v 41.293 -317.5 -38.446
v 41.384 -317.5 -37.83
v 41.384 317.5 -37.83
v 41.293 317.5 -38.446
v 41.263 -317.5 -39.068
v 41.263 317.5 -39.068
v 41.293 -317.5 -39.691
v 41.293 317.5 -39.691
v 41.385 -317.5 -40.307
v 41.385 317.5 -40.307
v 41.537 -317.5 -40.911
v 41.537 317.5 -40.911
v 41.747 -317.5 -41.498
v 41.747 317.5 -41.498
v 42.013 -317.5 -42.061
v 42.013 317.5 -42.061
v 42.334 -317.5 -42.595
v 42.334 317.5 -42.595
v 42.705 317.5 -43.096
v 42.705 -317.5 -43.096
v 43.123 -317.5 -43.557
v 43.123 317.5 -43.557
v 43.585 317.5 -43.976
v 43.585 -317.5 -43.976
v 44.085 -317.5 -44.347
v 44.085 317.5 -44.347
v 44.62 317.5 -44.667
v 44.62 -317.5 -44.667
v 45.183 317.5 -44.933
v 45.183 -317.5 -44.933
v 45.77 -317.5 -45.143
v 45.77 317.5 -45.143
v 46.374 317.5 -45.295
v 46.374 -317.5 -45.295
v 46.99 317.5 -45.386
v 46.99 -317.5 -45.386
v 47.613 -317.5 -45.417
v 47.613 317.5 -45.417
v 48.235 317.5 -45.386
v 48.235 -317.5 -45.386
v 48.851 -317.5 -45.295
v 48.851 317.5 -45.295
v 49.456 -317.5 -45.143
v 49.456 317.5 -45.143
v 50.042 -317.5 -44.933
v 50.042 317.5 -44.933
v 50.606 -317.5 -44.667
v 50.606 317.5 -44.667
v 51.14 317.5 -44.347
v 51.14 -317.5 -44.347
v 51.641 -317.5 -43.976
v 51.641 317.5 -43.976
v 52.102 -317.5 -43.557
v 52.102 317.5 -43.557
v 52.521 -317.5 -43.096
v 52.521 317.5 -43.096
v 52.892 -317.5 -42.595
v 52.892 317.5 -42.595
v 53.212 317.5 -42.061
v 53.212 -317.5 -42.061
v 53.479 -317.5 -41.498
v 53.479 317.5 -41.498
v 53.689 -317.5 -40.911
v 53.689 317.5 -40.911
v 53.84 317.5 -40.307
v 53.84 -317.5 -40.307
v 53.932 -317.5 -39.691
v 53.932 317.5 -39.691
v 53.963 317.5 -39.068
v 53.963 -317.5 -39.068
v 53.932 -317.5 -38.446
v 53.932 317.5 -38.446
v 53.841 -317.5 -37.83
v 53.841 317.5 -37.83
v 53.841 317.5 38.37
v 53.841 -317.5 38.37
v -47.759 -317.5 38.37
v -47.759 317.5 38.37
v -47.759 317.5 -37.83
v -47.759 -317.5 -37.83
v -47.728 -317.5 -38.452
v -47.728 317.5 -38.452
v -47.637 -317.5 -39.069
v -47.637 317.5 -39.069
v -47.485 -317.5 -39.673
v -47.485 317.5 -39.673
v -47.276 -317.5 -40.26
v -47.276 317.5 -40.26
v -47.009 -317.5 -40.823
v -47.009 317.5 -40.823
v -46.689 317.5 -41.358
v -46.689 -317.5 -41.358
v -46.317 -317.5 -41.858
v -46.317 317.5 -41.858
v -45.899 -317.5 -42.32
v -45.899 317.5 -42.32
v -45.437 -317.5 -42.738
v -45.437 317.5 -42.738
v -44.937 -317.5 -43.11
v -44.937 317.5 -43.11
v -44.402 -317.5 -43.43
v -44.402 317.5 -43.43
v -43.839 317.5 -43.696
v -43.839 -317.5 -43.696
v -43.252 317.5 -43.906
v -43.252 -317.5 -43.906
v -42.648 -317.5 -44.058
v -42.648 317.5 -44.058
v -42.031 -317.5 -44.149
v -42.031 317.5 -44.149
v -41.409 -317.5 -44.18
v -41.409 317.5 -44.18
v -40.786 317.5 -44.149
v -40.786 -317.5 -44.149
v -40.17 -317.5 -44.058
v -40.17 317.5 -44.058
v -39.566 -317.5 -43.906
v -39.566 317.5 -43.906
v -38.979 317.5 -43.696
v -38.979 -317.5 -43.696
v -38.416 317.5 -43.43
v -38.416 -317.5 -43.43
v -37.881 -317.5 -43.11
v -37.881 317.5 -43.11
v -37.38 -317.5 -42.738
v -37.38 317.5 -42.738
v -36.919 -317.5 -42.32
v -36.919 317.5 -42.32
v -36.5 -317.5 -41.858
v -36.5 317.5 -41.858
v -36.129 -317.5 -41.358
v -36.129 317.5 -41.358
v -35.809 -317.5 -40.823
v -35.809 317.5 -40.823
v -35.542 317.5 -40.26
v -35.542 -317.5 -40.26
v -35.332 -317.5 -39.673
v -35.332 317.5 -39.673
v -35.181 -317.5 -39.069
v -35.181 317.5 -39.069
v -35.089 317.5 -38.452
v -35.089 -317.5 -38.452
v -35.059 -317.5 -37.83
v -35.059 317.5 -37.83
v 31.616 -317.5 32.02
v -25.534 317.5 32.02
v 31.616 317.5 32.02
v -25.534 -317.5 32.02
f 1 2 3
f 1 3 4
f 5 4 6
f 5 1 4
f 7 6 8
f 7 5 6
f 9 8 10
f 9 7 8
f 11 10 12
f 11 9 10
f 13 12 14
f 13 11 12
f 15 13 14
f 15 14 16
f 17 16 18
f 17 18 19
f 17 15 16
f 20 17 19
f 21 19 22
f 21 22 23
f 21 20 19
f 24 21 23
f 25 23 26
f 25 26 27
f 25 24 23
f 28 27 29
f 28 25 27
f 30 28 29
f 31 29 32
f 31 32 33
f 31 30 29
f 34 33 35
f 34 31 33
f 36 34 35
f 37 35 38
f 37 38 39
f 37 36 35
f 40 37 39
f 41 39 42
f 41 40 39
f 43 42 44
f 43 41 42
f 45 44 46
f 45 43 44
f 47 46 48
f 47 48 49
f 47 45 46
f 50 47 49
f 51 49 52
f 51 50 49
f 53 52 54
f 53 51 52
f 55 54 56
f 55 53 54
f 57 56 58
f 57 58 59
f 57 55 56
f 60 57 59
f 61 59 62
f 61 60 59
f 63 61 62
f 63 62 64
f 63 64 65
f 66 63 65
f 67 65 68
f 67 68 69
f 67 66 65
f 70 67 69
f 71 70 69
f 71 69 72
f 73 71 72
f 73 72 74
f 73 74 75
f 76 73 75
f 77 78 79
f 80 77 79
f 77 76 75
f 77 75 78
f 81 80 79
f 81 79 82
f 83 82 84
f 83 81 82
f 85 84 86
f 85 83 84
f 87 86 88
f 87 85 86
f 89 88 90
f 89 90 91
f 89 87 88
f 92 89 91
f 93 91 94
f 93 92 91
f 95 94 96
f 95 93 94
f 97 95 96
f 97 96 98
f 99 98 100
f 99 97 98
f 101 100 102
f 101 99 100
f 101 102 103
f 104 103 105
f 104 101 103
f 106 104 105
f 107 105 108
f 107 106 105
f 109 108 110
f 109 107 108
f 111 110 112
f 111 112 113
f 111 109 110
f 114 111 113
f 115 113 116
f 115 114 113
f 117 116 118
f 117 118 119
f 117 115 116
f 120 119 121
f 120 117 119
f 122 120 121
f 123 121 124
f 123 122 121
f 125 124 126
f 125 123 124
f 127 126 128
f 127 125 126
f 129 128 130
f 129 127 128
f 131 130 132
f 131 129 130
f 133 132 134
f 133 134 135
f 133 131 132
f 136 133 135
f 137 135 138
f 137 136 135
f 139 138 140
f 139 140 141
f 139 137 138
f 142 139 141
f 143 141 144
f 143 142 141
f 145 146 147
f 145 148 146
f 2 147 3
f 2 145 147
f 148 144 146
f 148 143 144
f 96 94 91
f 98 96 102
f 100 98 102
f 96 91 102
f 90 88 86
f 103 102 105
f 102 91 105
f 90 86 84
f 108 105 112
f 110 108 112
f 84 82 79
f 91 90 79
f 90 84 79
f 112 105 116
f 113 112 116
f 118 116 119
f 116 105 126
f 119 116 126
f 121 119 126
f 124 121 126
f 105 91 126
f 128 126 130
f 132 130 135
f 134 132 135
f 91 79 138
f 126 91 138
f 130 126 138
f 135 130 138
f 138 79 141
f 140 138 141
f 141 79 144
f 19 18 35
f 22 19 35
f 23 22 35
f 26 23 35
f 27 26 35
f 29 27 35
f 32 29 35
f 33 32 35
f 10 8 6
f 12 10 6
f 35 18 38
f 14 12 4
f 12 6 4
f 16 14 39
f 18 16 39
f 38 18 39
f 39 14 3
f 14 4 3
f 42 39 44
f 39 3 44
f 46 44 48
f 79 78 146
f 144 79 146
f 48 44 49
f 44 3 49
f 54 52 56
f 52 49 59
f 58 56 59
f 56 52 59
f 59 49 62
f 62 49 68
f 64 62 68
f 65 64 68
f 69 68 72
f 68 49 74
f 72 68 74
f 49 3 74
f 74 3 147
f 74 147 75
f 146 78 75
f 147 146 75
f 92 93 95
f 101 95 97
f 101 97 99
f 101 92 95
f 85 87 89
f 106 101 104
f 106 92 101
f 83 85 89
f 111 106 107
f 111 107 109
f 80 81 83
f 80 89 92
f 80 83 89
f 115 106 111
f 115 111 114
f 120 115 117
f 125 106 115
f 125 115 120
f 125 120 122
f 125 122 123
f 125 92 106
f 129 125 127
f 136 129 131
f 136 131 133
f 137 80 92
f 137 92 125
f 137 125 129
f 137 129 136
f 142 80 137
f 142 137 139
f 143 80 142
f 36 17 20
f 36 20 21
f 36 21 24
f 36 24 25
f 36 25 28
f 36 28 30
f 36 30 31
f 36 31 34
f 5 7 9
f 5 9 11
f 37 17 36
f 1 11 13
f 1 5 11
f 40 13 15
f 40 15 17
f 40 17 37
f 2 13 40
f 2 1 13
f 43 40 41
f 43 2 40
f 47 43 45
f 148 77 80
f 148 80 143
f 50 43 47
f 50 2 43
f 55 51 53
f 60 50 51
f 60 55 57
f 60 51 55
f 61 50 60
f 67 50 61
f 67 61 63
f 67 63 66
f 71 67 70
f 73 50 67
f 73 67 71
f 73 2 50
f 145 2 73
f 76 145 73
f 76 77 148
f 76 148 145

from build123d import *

# Parameters (mm, degrees)
F1_DEPTH = 317.5


with BuildPart() as f1:
    # F0 (on Front) → F1 (new body, symmetric)
    with BuildSketch(Plane.XZ):
        with BuildLine():
            Line((53.8411306598, 32.0202162549), (31.6161306598, 32.0202162549))
            Line((31.6161306598, 32.0202162549), (41.3843568915, -37.8297837451))
            ThreePointArc((41.3843568915, -37.8297837451), (47.6127437756, -45.416592874), (53.8411306598, -37.8297837451))
            Line((53.8411306598, -37.8297837451), (53.8411306598, 32.0202162549))
        make_face()
        Polygon((3.0411306598, 38.3702162549), (3.0411306598, 32.0202162549), (31.6161306598, 32.0202162549), (53.8411306598, 32.0202162549), (53.8411306598, 38.3702162549), align=None)
        Polygon((-47.7588693402, 38.3702162549), (-47.7588693402, 32.0202162549), (-25.5338693402, 32.0202162549), (3.0411306598, 32.0202162549), (3.0411306598, 38.3702162549), align=None)
        with BuildLine():
            Line((-25.5338693402, 32.0202162549), (-47.7588693402, 32.0202162549))
            Line((-47.7588693402, 32.0202162549), (-47.7588693402, -37.8297837451))
            ThreePointArc((-47.7588693402, -37.8297837451), (-41.4088693402, -44.1797837451), (-35.0588693402, -37.8297837451))
            Line((-35.0588693402, -37.8297837451), (-25.5338693402, 32.0202162549))
        make_face()
    extrude(amount=F1_DEPTH, both=True)


solid = f1.part
